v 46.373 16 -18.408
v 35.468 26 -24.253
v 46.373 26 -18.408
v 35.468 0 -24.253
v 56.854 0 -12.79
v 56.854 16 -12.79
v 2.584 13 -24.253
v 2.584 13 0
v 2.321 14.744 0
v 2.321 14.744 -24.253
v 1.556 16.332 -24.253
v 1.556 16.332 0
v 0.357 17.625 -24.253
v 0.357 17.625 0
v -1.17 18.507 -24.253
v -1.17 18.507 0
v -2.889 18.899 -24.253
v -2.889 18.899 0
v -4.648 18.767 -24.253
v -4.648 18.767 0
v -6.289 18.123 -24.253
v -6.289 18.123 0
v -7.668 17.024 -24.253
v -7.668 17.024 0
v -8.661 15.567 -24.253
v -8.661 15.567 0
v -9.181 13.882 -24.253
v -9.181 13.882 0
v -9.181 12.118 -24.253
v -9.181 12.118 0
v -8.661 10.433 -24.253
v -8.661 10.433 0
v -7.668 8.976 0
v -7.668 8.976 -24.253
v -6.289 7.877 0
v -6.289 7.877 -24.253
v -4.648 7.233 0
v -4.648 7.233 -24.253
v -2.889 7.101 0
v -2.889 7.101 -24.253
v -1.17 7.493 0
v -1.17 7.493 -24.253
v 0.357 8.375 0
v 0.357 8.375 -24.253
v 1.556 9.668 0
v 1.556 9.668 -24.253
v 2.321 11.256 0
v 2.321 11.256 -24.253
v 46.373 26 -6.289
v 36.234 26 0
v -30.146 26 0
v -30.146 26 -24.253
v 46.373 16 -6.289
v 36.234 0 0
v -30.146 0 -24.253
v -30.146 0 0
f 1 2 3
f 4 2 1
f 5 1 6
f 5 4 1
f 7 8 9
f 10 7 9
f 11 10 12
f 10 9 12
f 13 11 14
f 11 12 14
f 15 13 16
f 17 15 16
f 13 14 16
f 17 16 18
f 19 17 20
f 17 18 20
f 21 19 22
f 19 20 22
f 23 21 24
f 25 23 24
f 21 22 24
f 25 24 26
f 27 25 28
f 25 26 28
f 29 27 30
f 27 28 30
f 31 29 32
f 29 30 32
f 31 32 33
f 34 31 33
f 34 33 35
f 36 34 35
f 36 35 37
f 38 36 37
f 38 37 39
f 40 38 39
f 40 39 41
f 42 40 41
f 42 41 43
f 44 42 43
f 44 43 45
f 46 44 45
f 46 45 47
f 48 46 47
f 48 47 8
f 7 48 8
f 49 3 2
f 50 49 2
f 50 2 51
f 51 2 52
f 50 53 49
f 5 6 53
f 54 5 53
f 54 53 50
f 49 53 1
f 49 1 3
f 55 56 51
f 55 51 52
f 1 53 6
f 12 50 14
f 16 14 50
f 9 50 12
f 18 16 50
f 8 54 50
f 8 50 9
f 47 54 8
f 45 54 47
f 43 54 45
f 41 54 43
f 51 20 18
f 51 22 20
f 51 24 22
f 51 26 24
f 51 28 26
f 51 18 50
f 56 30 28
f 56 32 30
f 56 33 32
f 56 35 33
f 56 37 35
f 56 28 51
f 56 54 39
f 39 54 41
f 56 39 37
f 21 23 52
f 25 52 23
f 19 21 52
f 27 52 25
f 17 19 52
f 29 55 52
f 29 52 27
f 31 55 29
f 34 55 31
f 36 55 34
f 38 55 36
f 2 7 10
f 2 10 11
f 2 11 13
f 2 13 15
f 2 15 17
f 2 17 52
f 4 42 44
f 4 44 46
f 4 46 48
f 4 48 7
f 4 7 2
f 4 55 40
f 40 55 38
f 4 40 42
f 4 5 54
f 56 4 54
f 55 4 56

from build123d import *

# Parameters (mm, degrees)
EXTRUDE_1_DEPTH     = 26
SKETCH_3_R          = 5.915746271
SKETCH_3_W          = 24.366628961
SKETCH_3_H          = 13.595872682
CUT_EXTRUDE_2_DEPTH = 46


with BuildPart() as part:
    # 스케치2 → 보스-돌출1 (new body)
    with BuildSketch(Plane(origin=(0, 0, 0), x_dir=(1, 0, 0), z_dir=(0, 1, 0))):
        Polygon((-30.145598194, 0), (-30.145598194, 24.253001272), (35.467738861, 24.253001272), (56.854401806, 12.789785553), (36.233634312, 0), align=None)
    extrude(amount=EXTRUDE_1_DEPTH)

    # 스케치3 → 컷-돌출2 (cut)
    with BuildSketch(Plane.XY):
        with Locations((-3.33144194, 13)):
            Circle(SKETCH_3_R)
        with Locations((58.556264228, 22.797936341)):
            Rectangle(SKETCH_3_W, SKETCH_3_H)
    extrude(amount=-CUT_EXTRUDE_2_DEPTH, mode=Mode.SUBTRACT)


solid = part.part
